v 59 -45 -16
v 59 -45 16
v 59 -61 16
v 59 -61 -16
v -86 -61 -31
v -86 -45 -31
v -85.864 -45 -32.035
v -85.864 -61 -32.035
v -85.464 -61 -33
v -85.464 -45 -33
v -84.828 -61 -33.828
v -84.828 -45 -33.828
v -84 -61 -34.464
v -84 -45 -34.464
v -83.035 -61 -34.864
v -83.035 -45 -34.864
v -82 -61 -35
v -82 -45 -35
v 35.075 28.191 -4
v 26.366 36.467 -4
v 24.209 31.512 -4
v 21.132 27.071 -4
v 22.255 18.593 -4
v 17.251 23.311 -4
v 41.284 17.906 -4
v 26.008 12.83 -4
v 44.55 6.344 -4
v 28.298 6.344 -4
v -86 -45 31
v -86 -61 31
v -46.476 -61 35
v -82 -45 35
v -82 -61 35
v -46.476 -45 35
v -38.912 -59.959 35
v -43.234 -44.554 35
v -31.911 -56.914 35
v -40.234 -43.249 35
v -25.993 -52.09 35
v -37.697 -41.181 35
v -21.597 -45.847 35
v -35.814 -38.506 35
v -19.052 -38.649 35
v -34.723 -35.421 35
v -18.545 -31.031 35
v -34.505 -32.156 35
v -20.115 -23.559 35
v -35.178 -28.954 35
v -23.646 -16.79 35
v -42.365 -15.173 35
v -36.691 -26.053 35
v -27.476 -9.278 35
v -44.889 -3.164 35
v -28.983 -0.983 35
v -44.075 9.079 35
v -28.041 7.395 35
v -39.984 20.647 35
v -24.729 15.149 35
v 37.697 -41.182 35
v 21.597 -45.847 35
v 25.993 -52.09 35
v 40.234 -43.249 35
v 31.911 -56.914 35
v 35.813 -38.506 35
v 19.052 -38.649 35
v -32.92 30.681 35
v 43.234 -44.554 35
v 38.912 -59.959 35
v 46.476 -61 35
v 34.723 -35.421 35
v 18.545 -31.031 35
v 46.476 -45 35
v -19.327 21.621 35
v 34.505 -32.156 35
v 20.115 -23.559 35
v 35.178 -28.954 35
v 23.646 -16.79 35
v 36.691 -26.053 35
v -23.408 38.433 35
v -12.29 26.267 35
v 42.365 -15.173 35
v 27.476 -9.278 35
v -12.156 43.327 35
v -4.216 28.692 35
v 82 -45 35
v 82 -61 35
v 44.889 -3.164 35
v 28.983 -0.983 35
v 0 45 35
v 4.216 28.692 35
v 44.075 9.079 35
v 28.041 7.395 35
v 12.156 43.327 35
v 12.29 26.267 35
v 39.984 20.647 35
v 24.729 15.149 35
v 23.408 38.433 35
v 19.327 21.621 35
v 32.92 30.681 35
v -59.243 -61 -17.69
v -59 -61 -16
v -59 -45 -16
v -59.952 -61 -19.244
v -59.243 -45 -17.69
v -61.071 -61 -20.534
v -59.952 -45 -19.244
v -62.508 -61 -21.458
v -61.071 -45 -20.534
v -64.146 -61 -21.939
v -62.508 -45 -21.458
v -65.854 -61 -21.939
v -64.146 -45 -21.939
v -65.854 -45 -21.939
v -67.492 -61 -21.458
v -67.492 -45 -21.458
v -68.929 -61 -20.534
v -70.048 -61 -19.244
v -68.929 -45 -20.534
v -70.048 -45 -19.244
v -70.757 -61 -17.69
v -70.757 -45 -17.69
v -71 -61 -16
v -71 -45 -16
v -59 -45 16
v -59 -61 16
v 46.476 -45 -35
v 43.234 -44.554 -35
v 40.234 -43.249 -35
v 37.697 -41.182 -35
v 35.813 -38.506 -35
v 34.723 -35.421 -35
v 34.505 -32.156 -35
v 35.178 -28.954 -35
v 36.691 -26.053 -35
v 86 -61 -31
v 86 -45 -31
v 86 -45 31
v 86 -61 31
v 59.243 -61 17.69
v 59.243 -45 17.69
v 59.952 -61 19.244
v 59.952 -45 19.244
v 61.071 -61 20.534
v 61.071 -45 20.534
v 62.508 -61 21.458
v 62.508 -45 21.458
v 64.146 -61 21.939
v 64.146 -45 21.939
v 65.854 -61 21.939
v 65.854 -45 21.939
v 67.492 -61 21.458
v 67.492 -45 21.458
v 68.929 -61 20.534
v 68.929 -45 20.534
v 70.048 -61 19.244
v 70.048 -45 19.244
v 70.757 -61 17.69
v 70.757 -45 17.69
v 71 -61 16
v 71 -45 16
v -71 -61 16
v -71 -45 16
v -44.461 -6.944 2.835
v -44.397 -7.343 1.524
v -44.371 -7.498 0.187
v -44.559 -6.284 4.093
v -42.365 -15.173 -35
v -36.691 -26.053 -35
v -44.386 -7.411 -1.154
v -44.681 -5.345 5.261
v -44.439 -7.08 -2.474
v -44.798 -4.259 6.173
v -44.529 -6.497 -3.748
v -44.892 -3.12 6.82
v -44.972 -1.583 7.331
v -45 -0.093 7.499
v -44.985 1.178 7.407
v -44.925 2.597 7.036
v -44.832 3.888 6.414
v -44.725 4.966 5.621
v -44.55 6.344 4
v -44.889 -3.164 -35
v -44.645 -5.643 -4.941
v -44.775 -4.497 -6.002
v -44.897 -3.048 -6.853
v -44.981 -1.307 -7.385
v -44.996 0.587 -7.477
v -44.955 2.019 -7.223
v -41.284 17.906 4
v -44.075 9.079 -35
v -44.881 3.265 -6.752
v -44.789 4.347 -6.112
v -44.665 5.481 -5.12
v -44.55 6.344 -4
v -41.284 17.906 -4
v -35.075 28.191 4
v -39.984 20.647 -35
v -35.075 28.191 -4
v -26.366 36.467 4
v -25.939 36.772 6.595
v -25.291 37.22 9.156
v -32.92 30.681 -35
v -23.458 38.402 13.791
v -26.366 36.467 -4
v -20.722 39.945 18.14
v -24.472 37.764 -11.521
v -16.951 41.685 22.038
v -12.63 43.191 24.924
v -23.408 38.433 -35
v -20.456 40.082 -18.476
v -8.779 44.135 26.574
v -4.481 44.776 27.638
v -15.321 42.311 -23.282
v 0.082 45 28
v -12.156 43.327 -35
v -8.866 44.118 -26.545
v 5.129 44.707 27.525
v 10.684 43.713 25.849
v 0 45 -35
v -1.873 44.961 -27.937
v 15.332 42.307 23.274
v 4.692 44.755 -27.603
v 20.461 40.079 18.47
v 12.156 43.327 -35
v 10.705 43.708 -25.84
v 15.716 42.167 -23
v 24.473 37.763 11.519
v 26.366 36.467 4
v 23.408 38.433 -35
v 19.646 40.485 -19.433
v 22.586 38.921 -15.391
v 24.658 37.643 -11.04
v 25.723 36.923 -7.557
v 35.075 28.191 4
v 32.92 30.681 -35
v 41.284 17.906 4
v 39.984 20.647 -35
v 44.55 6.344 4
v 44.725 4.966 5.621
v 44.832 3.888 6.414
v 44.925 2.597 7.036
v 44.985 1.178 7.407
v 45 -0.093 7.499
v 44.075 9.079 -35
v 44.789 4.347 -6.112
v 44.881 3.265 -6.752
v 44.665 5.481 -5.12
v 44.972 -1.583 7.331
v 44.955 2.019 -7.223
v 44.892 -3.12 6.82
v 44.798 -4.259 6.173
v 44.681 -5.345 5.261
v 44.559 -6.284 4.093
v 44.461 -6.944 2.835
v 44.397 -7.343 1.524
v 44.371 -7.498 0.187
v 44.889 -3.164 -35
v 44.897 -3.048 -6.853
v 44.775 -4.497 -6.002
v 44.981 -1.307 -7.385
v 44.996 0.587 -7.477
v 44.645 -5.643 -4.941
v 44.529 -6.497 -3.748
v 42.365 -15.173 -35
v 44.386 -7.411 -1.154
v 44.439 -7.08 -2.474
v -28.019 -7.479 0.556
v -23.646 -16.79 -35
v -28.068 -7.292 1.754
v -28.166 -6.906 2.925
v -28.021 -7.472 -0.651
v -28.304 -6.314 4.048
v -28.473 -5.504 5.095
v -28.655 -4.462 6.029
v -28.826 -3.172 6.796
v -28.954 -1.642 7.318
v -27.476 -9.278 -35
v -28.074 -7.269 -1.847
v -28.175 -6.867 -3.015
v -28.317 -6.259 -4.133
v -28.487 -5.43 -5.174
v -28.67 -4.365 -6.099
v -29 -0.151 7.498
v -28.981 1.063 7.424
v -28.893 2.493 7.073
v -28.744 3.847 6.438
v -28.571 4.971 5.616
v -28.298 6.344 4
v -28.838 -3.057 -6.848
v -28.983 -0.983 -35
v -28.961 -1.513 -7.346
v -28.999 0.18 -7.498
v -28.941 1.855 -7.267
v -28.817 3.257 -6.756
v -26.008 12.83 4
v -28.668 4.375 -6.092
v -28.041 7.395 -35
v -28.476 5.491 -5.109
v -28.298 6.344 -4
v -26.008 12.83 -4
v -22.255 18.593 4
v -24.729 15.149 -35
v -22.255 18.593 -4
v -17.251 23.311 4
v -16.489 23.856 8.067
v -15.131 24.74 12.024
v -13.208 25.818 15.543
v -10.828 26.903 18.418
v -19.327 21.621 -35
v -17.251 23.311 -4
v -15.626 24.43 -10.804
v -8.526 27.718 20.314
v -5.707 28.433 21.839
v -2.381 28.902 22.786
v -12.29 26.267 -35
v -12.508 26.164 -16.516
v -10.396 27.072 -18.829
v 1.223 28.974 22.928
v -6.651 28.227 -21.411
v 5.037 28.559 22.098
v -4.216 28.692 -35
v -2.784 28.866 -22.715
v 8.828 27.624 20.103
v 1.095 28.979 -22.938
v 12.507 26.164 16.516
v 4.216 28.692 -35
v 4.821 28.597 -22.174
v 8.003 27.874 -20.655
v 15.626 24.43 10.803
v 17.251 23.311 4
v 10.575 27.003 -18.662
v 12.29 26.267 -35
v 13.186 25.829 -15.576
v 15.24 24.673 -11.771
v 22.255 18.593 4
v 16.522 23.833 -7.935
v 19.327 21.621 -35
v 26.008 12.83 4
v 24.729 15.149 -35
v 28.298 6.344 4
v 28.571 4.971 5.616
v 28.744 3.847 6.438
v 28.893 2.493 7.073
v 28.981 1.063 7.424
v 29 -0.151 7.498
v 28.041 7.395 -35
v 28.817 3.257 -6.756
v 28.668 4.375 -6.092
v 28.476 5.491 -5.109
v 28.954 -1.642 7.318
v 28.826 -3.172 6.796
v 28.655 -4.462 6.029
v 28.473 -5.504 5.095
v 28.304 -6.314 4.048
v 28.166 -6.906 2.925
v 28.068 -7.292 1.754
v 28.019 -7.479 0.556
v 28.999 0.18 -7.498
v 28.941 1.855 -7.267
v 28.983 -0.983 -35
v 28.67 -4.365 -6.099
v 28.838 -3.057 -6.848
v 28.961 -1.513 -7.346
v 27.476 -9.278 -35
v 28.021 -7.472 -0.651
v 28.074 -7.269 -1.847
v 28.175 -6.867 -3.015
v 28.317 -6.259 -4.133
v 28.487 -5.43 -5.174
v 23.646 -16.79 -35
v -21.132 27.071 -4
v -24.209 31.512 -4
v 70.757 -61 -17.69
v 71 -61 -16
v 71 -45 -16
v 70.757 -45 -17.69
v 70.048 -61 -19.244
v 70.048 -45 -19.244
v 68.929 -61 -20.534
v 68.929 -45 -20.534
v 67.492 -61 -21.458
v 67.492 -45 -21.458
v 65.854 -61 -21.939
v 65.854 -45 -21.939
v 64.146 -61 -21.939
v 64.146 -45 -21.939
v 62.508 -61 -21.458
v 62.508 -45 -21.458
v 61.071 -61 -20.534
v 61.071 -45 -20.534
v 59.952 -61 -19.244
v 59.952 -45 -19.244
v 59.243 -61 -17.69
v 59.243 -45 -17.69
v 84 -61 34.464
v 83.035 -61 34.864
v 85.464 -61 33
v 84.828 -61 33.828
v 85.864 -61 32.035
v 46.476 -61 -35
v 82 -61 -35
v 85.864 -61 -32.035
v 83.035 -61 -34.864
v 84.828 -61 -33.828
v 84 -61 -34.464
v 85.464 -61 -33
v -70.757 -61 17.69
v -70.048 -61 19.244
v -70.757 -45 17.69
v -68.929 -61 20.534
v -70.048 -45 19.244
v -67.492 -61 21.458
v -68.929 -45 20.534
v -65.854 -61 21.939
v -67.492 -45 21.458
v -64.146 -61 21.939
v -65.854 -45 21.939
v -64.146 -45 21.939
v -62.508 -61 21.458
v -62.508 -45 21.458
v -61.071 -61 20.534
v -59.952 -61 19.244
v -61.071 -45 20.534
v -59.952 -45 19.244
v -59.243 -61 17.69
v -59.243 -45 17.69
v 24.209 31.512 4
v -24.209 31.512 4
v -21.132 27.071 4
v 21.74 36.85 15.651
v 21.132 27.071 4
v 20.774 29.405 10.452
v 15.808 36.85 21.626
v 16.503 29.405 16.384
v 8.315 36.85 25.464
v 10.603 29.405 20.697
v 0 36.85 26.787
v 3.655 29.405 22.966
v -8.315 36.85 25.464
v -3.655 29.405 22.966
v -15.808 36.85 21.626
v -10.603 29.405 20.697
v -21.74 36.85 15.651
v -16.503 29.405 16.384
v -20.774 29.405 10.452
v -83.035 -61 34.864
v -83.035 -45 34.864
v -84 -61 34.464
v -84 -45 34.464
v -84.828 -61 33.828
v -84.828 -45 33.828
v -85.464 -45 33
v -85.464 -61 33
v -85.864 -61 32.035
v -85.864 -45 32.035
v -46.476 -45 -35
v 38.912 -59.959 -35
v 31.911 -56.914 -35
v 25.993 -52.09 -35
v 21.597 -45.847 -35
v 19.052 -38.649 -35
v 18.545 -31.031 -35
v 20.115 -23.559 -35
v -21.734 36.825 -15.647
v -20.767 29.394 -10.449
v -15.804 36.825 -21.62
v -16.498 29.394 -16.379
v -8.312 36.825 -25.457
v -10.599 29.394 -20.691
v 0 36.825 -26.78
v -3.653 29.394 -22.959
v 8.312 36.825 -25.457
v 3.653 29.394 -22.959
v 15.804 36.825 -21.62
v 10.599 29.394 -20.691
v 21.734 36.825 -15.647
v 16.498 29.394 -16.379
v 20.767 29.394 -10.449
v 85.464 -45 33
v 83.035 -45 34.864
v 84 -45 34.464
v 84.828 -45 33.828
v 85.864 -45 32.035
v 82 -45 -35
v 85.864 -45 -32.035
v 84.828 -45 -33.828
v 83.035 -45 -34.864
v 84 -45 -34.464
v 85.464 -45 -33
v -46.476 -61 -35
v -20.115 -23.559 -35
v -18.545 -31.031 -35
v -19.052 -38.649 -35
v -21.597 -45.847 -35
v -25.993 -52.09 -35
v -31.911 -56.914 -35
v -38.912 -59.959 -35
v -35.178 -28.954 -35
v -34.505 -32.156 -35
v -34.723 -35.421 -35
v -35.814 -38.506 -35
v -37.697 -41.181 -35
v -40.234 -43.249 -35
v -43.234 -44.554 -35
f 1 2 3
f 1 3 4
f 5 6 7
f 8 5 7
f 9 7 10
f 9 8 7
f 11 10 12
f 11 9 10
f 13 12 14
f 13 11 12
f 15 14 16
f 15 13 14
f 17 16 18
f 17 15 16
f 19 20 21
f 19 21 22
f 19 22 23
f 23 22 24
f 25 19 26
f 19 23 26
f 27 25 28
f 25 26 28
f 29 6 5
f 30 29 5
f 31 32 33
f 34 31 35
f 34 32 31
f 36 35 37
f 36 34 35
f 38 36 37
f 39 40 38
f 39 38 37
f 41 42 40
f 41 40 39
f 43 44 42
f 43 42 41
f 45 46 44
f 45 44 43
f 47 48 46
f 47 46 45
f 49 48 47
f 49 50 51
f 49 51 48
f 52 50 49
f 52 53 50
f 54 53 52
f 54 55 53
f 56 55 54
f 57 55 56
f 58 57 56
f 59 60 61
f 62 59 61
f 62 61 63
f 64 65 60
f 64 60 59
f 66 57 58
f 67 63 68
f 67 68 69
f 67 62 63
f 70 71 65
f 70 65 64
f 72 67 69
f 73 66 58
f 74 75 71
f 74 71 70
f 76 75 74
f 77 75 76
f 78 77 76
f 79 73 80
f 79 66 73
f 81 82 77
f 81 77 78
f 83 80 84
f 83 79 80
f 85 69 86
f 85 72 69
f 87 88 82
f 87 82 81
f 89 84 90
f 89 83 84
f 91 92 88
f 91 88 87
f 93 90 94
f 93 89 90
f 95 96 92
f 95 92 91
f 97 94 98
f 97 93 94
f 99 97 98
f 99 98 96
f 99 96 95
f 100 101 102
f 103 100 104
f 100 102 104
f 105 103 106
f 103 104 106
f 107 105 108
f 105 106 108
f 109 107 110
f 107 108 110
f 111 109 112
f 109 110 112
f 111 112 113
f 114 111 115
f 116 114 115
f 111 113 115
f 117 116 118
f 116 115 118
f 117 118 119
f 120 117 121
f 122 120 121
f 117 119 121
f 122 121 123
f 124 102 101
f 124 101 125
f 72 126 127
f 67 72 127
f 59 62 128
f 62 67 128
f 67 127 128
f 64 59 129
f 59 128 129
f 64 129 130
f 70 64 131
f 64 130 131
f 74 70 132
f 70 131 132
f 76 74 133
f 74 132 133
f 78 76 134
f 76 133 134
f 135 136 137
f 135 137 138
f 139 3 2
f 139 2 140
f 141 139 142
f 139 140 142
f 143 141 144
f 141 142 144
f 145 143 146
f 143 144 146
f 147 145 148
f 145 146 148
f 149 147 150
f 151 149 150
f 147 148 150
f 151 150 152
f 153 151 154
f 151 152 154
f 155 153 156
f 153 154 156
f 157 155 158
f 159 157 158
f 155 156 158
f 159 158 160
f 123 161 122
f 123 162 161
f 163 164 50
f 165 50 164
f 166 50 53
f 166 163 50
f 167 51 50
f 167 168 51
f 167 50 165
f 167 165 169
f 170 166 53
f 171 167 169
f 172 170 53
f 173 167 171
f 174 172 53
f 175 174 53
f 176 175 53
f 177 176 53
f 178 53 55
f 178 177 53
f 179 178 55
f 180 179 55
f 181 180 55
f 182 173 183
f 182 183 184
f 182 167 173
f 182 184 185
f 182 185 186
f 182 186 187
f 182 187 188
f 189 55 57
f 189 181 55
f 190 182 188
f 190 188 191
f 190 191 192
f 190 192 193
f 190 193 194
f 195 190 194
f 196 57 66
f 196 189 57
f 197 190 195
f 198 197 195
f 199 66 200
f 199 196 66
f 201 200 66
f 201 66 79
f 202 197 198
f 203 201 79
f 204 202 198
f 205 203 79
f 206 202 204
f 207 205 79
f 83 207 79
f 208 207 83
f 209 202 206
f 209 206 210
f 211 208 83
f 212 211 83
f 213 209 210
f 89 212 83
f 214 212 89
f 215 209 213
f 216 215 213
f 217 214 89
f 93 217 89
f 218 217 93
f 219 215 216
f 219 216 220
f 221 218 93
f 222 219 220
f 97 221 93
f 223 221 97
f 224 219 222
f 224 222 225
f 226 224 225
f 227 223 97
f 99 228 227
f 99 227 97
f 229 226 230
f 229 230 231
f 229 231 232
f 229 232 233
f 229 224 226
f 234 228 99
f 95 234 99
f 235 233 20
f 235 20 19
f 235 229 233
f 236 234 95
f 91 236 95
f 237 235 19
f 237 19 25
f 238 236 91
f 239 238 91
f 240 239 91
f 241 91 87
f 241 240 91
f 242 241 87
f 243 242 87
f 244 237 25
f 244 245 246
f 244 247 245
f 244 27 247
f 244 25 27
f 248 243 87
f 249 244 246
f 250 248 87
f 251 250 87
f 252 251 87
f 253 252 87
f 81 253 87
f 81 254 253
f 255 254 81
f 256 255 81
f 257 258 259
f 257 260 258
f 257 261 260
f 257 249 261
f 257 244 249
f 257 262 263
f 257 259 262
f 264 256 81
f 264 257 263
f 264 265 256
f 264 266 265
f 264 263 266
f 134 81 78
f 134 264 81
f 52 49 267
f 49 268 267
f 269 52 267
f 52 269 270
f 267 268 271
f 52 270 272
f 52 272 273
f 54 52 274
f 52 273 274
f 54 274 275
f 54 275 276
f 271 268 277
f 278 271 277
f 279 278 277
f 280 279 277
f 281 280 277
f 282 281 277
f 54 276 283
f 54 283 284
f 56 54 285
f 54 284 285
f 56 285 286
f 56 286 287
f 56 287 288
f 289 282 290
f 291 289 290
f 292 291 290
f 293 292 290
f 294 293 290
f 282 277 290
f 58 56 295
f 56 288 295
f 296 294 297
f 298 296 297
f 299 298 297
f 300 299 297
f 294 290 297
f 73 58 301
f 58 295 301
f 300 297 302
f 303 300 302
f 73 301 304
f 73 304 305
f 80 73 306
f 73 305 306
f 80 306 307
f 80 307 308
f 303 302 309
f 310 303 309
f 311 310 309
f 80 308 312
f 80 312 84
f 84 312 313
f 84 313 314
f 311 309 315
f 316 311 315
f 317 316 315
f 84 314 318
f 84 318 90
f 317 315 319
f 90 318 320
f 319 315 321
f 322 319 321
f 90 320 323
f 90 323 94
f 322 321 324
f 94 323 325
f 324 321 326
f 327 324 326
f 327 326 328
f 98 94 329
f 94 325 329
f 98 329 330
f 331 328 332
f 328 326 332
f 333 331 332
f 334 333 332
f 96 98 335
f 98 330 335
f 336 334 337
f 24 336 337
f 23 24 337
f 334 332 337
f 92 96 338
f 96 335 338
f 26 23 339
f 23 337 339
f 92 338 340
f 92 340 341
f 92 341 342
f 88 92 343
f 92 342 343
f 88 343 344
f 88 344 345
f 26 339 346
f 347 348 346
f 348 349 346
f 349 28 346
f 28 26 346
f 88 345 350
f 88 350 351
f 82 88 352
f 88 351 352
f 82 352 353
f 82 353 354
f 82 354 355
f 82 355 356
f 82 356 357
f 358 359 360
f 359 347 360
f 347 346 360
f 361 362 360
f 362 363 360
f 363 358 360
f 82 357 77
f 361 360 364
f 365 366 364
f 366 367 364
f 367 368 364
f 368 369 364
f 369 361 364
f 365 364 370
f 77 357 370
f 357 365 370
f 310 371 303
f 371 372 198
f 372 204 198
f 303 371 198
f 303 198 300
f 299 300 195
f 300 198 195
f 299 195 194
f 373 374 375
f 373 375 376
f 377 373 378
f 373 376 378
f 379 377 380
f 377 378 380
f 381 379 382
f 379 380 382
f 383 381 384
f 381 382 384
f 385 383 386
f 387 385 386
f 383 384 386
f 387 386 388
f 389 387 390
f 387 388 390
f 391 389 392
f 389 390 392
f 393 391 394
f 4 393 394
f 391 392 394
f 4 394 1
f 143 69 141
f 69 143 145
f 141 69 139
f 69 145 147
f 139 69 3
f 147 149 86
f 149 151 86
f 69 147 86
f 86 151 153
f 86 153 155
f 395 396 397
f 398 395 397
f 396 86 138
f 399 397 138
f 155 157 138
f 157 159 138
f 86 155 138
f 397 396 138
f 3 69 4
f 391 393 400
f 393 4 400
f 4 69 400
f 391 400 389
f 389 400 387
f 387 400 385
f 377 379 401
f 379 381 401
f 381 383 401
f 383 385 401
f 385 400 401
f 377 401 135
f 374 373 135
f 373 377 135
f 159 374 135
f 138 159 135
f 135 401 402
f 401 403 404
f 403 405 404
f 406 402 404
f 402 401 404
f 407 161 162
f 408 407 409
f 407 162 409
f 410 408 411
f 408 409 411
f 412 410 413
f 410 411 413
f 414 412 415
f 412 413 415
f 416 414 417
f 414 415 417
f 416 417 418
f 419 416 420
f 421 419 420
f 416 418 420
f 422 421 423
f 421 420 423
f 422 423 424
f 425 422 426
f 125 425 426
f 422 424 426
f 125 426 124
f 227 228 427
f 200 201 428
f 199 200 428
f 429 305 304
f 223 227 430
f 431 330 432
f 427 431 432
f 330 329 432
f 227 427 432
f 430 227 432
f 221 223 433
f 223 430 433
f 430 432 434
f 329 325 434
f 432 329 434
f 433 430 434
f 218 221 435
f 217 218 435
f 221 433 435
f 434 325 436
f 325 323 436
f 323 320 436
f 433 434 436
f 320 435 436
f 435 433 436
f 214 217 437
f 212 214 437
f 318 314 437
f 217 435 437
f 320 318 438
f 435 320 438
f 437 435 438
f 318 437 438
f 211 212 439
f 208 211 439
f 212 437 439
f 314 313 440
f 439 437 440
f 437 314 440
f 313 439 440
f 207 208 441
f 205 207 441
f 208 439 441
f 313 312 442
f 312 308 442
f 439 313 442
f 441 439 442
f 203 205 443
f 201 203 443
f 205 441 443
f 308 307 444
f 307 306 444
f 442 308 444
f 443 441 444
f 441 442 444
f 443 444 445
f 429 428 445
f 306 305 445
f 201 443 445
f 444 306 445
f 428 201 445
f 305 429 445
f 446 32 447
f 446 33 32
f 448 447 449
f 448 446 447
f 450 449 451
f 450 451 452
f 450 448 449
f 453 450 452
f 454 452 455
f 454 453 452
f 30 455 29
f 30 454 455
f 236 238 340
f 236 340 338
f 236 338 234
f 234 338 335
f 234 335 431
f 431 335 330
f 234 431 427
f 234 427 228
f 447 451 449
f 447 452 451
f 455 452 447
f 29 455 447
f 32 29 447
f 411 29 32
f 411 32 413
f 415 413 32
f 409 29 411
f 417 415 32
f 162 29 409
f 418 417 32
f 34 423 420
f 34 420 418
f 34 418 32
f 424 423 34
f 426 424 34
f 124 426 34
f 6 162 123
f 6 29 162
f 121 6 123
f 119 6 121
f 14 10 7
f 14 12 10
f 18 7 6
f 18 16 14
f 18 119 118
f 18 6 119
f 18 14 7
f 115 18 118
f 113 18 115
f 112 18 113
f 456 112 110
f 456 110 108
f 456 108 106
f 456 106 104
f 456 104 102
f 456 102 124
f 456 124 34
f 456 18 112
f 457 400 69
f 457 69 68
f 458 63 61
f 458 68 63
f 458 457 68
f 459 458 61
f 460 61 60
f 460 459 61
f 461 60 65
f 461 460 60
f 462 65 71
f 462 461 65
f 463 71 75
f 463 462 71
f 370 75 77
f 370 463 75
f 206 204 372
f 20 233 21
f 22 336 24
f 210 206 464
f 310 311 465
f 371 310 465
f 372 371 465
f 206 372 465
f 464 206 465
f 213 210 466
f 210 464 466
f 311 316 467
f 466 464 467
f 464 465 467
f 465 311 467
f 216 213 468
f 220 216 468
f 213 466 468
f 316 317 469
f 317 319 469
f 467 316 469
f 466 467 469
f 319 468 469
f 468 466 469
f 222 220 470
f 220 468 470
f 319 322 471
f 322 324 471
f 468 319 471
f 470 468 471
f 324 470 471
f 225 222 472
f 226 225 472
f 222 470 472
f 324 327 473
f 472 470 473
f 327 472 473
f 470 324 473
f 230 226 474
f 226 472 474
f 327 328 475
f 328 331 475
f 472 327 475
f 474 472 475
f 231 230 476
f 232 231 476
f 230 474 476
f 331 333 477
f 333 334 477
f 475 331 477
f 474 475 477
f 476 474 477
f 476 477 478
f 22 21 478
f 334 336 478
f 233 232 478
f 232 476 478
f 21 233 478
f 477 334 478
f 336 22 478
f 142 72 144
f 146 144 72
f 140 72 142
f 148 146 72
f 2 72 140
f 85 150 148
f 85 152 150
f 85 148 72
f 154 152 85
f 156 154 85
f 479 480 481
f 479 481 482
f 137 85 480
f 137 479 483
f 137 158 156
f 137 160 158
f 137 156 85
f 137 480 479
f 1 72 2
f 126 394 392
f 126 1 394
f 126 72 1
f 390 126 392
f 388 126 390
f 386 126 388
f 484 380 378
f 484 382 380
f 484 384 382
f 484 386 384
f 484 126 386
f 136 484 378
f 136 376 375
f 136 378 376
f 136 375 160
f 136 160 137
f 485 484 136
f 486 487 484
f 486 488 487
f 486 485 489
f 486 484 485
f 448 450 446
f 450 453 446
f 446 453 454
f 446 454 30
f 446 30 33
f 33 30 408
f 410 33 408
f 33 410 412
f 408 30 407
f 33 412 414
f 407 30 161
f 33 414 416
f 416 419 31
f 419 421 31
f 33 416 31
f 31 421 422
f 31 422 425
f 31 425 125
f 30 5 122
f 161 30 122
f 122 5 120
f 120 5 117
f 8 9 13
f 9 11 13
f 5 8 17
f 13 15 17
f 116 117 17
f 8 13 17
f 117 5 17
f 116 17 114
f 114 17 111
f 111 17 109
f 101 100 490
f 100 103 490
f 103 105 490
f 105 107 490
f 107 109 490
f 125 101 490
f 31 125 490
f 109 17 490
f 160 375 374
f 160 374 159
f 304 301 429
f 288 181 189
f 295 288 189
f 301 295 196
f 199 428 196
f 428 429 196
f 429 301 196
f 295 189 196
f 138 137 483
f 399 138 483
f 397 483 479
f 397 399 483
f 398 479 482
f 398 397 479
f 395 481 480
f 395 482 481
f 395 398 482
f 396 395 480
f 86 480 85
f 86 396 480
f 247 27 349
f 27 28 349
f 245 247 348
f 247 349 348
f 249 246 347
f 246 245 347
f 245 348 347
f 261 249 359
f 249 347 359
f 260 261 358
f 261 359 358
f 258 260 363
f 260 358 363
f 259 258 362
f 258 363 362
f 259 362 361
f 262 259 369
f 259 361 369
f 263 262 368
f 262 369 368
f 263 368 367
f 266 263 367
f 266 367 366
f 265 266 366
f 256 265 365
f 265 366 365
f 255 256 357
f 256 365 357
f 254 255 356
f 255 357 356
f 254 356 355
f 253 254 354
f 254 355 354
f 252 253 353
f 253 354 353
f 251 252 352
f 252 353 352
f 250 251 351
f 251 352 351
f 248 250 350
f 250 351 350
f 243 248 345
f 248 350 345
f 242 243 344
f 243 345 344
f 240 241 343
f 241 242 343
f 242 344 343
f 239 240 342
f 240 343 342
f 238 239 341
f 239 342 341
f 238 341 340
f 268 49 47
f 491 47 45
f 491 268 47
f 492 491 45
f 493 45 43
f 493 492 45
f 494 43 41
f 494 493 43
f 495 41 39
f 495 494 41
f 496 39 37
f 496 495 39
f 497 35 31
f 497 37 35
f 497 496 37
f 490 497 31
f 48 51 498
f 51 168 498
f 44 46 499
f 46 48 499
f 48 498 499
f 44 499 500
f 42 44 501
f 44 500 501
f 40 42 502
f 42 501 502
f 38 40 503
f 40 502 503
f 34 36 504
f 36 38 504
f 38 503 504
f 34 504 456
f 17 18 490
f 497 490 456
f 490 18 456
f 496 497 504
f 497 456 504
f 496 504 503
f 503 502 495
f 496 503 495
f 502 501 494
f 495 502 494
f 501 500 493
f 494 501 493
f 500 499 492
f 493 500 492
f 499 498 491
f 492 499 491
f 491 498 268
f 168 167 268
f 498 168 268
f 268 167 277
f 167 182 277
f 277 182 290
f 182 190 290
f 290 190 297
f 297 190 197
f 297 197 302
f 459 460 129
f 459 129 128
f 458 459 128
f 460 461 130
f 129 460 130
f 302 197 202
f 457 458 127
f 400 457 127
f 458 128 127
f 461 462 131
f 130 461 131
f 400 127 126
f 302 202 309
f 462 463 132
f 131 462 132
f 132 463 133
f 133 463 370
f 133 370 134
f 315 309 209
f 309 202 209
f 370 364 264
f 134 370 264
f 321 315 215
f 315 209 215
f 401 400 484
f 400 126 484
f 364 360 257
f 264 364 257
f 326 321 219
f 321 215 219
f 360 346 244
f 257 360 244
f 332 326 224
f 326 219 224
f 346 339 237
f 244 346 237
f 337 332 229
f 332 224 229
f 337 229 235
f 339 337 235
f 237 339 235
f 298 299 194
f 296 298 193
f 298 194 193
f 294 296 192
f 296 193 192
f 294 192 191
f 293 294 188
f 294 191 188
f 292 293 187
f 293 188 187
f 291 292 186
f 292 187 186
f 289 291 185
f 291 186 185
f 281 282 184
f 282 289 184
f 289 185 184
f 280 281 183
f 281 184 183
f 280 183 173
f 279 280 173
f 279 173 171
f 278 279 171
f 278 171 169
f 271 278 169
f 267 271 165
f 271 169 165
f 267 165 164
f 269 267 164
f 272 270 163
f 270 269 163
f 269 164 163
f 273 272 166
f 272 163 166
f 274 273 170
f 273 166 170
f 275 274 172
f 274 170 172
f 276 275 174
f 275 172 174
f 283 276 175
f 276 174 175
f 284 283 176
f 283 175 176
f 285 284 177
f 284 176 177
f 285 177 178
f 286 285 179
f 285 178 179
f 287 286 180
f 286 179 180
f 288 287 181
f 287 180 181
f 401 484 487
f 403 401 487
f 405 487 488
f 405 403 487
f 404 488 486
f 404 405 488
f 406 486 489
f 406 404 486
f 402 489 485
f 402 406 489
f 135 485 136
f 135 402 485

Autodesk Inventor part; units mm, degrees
ref_plane "YZ Plane" through (0, 0, 0) normal (1, 0, 0) x (0, 1, 0)
ref_plane "XZ Plane" through (0, 0, 0) normal (0, 1, 0) x (-1, 0, 0)
ref_plane "XY Plane" through (0, 0, 0) normal (0, 0, 1) x (1, 0, 0)
sketch "Sketch1" plane through (0, 0, 0) normal (0, 0, 1) x (1, 0, 0)
  line L0 (-86, -45) -> (-46.4758, -45)
  arc A0 (-46.4758, -45) -> (-36.6914, -26.0526) centre (-46.4758, -33) ccw
  arc A1 (36.6914, -26.0526) -> (-36.6914, -26.0526) centre (0, 0) ccw
  arc A2 (36.6914, -26.0526) -> (46.4758, -45) centre (46.4758, -33) ccw
  line L1 (46.4758, -45) -> (86, -45)
  line L2 (0, -90.5431) -> (0, 67.5905) construction
  line L3 (-86, -61) -> (-46.4758, -61)
  arc A3 (-46.4758, -61) -> (-23.6456, -16.7895) centre (-46.4758, -33) ccw
  arc A4 (23.6456, -16.7895) -> (-23.6456, -16.7895) centre (0, 0) ccw
  arc A5 (23.6456, -16.7895) -> (46.4758, -61) centre (46.4758, -33) ccw
  line L4 (46.4758, -61) -> (86, -61)
  line L5 (-86, -45) -> (-86, -61)
  line L6 (86, -45) -> (86, -61)
  dimension "d0" = 90
  dimension "d1" = 12
  dimension "d2" = 45
  dimension "d3" = 172
  dimension "d4" = 16
extrude "Extrusion1" add sketch "Sketch1" along normal mid plane 70
sketch "Sketch2" plane through (0, 0, 0) normal (1, 0, 0) x (0, 1, 0)
  arc A0 (6.3443, 4) -> (6.3443, -4) centre (0, 0) ccw
  line L0 (6.3443, 4) -> (45, 4)
  line L1 (45, 4) -> (45, -4)
  line L2 (45, -4) -> (6.3443, -4)
  line L3 (45, -35) -> (45, 35) projected
  dimension "d7" = 15
  dimension "d8" = 8
extrude "Extrusion2" cut sketch "Sketch2" along normal through all both and the other way through all
sketch "Sketch3" plane through (0, 0, 0) normal (0, 0, 1) x (1, 0, 0)
  arc A0 (0, 73) -> (0, 17) centre (0, 45) ccw
  line L0 (-86, -61) -> (-46.4758, -61) projected
  line L1 (0, 73) -> (0, 17)
  arc A1 (44.5505, 6.3443) -> (-44.5505, 6.3443) centre (0, 0) ccw projected
  point P0 (-66.2379, -61)
  point P1 (0, 45)
  dimension "d11" = 28
  dimension "d12" = 106
revolve "Revolution1" cut sketch "Sketch3" angle 360 about axis through (0, 73, 0) along (0, -1, 0)
sketch "Sketch4" plane through (46.4758, -45, 35) normal (0, 1, 0) x (1, 0, 0)
  line L0 (18.5242, 19) -> (18.5242, 51) construction
  line L1 (12.5242, 19) -> (12.5242, 51)
  line L2 (24.5242, 51) -> (24.5242, 19)
  arc A0 (12.5242, 19) -> (24.5242, 19) centre (18.5242, 19) ccw
  arc A1 (24.5242, 51) -> (12.5242, 51) centre (18.5242, 51) ccw
  point P0 (-46.4758, 35)
  point P1 (18.5242, 35)
  dimension "d14" = 6
  dimension "d15" = 32
  dimension "d16" = 65
extrude "Extrusion3" cut sketch "Sketch4" against normal through all
mirror "Mirror1" about plane through (0, 0, 0) normal (1, 0, 0) of "Extrusion3"
fillet "Fillet1" radius 4 4 edges at (-86, -53, 35) (-86, -53, -35) (86, -53, 35) (86, -53, -35)
properties part number "Part013. Fulcrum" material "Steel, Carbon"
